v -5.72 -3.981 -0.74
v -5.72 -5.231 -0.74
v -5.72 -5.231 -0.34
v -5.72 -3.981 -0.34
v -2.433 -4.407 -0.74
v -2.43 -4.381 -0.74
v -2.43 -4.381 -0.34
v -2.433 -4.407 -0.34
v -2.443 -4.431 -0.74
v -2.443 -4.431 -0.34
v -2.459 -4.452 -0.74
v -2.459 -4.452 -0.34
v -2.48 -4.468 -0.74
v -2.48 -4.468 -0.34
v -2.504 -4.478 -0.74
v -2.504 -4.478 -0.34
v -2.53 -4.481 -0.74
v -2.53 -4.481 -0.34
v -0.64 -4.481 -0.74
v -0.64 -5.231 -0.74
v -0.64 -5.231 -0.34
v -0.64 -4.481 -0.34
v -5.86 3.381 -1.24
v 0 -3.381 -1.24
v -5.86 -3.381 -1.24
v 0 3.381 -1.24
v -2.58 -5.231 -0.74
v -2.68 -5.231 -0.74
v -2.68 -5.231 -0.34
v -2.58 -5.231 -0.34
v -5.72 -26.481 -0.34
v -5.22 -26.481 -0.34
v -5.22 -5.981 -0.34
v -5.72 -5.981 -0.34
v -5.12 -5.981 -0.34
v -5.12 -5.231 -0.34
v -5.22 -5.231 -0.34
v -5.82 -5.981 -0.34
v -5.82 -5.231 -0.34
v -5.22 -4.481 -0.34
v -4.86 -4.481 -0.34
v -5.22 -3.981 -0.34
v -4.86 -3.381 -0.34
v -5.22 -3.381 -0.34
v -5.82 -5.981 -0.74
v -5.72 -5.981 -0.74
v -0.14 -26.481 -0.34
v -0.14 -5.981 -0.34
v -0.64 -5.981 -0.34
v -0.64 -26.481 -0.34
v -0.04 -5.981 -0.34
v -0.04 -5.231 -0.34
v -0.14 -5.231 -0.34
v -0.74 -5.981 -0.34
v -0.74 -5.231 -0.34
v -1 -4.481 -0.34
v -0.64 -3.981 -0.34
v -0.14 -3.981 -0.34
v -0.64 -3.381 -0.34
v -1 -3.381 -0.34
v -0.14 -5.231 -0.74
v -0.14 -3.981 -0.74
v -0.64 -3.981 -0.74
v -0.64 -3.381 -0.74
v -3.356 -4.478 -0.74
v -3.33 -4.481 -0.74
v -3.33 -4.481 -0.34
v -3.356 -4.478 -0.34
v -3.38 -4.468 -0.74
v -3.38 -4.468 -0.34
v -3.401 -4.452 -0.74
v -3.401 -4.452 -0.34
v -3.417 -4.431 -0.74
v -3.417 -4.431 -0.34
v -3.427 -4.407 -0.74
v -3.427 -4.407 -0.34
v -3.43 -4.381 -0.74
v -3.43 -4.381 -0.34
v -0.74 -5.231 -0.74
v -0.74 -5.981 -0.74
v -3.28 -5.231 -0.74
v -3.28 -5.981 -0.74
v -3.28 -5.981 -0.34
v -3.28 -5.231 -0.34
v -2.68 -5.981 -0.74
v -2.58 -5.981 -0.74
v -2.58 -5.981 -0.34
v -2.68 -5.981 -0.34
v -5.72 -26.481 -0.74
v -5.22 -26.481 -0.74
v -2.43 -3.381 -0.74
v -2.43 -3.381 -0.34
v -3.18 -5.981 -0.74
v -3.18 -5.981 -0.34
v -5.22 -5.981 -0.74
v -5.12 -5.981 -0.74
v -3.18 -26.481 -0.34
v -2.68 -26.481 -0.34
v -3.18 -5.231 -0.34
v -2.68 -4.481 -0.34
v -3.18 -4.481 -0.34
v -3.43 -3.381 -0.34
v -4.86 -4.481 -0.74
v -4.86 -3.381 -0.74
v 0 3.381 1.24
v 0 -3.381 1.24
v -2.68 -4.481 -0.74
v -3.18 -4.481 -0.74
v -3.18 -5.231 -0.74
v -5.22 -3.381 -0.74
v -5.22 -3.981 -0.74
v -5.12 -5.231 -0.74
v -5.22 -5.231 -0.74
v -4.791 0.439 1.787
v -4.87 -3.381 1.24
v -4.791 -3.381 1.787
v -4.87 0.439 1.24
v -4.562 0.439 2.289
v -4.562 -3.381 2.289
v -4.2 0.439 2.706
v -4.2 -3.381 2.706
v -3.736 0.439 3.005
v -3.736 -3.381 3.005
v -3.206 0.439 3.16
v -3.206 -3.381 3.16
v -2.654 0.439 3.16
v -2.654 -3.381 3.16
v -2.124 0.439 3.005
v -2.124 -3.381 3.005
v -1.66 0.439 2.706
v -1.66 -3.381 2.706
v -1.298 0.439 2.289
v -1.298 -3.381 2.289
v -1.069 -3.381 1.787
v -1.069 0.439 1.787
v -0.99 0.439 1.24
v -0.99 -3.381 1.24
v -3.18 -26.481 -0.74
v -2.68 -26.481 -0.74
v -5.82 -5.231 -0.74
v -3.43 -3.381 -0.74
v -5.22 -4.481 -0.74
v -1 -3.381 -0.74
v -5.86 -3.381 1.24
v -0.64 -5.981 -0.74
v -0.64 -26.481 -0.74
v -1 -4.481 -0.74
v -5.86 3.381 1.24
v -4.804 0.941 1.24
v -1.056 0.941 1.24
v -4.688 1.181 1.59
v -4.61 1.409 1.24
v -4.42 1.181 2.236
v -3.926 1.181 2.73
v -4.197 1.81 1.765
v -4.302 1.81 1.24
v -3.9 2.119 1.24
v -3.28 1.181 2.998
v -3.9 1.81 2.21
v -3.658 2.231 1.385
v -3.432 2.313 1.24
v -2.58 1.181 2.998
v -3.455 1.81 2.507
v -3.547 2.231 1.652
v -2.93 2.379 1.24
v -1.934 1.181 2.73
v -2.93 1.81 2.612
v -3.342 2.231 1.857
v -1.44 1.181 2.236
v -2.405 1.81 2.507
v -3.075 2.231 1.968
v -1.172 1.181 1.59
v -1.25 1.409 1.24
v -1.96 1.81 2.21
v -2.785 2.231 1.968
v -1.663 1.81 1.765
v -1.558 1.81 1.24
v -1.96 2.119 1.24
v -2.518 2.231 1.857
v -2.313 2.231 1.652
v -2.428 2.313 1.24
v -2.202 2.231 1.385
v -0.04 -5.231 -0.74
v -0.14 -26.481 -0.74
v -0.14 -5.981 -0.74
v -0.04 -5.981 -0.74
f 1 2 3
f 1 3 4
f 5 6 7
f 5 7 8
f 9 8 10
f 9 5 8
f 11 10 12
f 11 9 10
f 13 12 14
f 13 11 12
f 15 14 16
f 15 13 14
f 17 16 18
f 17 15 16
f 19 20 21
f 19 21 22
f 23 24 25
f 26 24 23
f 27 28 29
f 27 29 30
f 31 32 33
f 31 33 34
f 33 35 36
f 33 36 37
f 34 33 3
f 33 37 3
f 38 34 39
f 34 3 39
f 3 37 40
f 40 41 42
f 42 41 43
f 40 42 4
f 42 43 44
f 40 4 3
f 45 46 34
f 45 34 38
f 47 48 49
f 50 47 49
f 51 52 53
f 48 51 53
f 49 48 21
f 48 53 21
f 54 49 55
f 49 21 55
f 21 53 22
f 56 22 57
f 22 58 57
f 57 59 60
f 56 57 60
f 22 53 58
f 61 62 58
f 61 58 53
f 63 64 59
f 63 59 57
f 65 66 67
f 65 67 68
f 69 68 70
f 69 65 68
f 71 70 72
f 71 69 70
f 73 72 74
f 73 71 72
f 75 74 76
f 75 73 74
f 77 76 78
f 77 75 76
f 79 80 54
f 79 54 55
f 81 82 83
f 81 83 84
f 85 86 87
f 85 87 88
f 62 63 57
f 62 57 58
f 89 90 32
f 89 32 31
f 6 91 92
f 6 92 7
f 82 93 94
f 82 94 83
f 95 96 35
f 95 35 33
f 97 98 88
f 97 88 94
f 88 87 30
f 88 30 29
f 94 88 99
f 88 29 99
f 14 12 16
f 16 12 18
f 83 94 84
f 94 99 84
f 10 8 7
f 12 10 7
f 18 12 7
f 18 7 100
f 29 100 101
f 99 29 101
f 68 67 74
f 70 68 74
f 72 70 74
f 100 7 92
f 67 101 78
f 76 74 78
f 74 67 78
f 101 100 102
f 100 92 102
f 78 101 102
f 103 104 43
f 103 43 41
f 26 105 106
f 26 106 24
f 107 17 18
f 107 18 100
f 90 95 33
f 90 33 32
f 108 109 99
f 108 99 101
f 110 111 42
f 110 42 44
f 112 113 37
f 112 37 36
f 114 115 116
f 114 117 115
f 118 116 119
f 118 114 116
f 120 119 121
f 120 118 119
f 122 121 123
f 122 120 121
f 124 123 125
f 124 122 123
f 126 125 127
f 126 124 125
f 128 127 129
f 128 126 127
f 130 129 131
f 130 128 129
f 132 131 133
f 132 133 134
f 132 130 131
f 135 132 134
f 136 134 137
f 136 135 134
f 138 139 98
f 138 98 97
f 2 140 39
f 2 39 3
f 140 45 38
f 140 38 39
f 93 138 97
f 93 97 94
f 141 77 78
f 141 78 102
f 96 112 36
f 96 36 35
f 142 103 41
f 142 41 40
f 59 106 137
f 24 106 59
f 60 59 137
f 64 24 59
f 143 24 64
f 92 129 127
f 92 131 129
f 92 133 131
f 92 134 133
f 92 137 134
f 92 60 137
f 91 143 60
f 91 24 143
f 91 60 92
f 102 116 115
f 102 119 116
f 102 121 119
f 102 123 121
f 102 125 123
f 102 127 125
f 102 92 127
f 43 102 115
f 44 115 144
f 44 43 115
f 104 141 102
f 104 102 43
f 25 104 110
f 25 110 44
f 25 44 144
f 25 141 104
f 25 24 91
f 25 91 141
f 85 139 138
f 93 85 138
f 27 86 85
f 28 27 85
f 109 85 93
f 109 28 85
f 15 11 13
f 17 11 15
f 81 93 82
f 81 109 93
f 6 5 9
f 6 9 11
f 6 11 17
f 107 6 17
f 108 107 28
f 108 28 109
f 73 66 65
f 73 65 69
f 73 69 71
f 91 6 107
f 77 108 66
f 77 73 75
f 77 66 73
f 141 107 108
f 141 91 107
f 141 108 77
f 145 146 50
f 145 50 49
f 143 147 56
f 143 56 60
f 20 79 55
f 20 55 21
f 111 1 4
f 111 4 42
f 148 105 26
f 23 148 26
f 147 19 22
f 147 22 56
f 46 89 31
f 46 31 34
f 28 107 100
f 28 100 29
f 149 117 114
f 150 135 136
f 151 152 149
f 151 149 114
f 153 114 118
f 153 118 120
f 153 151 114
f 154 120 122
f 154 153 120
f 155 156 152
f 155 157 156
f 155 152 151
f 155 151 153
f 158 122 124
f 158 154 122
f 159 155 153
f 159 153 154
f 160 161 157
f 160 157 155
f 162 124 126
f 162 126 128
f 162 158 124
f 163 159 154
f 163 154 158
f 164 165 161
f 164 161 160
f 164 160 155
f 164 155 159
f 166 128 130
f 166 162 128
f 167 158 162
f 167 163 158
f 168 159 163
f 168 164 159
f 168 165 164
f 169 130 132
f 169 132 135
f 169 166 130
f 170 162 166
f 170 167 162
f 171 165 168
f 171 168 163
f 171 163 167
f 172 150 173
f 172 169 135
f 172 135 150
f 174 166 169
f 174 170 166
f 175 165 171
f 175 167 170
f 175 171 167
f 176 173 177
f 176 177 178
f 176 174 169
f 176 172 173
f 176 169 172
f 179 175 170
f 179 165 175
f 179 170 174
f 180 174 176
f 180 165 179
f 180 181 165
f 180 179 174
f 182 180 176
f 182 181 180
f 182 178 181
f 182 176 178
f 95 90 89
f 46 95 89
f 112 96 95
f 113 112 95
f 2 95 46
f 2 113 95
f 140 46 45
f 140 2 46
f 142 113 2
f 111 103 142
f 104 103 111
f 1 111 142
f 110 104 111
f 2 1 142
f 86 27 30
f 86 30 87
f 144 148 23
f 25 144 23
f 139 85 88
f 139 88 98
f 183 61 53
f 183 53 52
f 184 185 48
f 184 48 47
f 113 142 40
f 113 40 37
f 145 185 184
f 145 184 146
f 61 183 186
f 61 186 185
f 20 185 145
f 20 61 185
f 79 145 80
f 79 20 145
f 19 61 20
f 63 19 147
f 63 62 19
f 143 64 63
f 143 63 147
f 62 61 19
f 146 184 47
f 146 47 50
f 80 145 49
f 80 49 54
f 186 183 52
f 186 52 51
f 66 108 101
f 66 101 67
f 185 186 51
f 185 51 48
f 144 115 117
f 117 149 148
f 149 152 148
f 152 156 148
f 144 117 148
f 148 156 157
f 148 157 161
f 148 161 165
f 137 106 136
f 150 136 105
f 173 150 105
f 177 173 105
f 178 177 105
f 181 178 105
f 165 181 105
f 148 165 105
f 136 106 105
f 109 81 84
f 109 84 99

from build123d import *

# Parameters (mm, degrees)
IZIM2_W                     = 2.48
IZIM2_H                     = 6.762592592
Y_KSEKLIK_EKSTR_ZYON2_DEPTH = 5.86
Y_KSEKLIK_EKSTR_ZYON3_DEPTH = 0.4


# Read off the part's stored shape, not the designer's step: Döndür1
with BuildPart() as part:
    # Çizim2 → Yükseklik-Ekstrüzyon2 (new body)
    with BuildSketch(Plane(origin=(0, 0, 0), x_dir=(0, 0, -1), z_dir=(1, 0, 0))):
        Rectangle(IZIM2_W, IZIM2_H)
    extrude(amount=-Y_KSEKLIK_EKSTR_ZYON2_DEPTH)

    # Döndür1 outline → Döndür1 (revolve)
    with BuildSketch(Plane(origin=(-2.93, 0, 1.24), x_dir=(1, 0, 0), z_dir=(0, 0, 1))):
        with BuildLine():
            Line((0, 2.378703704), (0, -3.381296296))
            Line((0, -3.381296296), (1.94, -3.381296296))
            Line((1.94, -3.381296296), (1.94, 0.438703704))
            ThreePointArc((1.94, 0.438703704), (1.371787155, 1.810490859), (0, 2.378703704))
        make_face()
    revolve(axis=Axis((-2.93, 0, 1.24), (0, 1, 0)))

    # Çizim6 → Yükseklik-Ekstrüzyon3 (add)
    with BuildSketch(Plane(origin=(0, 0, -0.74), x_dir=(-1, 0, 0), z_dir=(0, 0, -1))):
        with BuildLine():
            Line((2.43, -3.381296296), (2.43, -4.381296296))
            ThreePointArc((2.43, -4.381296296), (2.459289322, -4.452006974), (2.53, -4.481296296))
            Line((2.53, -4.481296296), (2.68, -4.481296296))
            Line((2.68, -4.481296296), (2.68, -5.231296296))
            Line((2.68, -5.231296296), (2.58, -5.231296296))
            Line((2.58, -5.231296296), (2.58, -5.981296296))
            Line((2.58, -5.981296296), (2.68, -5.981296296))
            Line((2.68, -5.981296296), (2.68, -26.481296296))
            Line((2.68, -26.481296296), (3.18, -26.481296296))
            Line((3.18, -26.481296296), (3.18, -5.981296296))
            Line((3.18, -5.981296296), (3.28, -5.981296296))
            Line((3.28, -5.981296296), (3.28, -5.231296296))
            Line((3.28, -5.231296296), (3.18, -5.231296296))
            Line((3.18, -5.231296296), (3.18, -4.481296296))
            Line((3.18, -4.481296296), (3.33, -4.481296296))
            ThreePointArc((3.33, -4.481296296), (3.400710678, -4.452006974), (3.43, -4.381296296))
            Line((3.43, -4.381296296), (3.43, -3.381296296))
            Line((3.43, -3.381296296), (2.43, -3.381296296))
        make_face()
        Polygon((5.22, -4.481296296), (5.22, -5.231296296), (5.12, -5.231296296), (5.12, -5.981296296), (5.22, -5.981296296), (5.22, -26.481296296), (5.72, -26.481296296), (5.72, -5.981296296), (5.82, -5.981296296), (5.82, -5.231296296), (5.72, -5.231296296), (5.72, -4.481296296), (5.72, -3.981296296), (5.22, -3.981296296), (5.22, -3.381296296), (4.86, -3.381296296), (4.86, -4.481296296), align=None)
        Polygon((0.14, -4.481296296), (0.14, -5.231296296), (0.04, -5.231296296), (0.04, -5.981296296), (0.14, -5.981296296), (0.14, -26.481296296), (0.64, -26.481296296), (0.64, -5.981296296), (0.74, -5.981296296), (0.74, -5.231296296), (0.64, -5.231296296), (0.64, -4.481296296), (1, -4.481296296), (1, -3.381296296), (0.64, -3.381296296), (0.64, -3.981296296), (0.14, -3.981296296), align=None)
    extrude(amount=-Y_KSEKLIK_EKSTR_ZYON3_DEPTH)


solid = part.part
